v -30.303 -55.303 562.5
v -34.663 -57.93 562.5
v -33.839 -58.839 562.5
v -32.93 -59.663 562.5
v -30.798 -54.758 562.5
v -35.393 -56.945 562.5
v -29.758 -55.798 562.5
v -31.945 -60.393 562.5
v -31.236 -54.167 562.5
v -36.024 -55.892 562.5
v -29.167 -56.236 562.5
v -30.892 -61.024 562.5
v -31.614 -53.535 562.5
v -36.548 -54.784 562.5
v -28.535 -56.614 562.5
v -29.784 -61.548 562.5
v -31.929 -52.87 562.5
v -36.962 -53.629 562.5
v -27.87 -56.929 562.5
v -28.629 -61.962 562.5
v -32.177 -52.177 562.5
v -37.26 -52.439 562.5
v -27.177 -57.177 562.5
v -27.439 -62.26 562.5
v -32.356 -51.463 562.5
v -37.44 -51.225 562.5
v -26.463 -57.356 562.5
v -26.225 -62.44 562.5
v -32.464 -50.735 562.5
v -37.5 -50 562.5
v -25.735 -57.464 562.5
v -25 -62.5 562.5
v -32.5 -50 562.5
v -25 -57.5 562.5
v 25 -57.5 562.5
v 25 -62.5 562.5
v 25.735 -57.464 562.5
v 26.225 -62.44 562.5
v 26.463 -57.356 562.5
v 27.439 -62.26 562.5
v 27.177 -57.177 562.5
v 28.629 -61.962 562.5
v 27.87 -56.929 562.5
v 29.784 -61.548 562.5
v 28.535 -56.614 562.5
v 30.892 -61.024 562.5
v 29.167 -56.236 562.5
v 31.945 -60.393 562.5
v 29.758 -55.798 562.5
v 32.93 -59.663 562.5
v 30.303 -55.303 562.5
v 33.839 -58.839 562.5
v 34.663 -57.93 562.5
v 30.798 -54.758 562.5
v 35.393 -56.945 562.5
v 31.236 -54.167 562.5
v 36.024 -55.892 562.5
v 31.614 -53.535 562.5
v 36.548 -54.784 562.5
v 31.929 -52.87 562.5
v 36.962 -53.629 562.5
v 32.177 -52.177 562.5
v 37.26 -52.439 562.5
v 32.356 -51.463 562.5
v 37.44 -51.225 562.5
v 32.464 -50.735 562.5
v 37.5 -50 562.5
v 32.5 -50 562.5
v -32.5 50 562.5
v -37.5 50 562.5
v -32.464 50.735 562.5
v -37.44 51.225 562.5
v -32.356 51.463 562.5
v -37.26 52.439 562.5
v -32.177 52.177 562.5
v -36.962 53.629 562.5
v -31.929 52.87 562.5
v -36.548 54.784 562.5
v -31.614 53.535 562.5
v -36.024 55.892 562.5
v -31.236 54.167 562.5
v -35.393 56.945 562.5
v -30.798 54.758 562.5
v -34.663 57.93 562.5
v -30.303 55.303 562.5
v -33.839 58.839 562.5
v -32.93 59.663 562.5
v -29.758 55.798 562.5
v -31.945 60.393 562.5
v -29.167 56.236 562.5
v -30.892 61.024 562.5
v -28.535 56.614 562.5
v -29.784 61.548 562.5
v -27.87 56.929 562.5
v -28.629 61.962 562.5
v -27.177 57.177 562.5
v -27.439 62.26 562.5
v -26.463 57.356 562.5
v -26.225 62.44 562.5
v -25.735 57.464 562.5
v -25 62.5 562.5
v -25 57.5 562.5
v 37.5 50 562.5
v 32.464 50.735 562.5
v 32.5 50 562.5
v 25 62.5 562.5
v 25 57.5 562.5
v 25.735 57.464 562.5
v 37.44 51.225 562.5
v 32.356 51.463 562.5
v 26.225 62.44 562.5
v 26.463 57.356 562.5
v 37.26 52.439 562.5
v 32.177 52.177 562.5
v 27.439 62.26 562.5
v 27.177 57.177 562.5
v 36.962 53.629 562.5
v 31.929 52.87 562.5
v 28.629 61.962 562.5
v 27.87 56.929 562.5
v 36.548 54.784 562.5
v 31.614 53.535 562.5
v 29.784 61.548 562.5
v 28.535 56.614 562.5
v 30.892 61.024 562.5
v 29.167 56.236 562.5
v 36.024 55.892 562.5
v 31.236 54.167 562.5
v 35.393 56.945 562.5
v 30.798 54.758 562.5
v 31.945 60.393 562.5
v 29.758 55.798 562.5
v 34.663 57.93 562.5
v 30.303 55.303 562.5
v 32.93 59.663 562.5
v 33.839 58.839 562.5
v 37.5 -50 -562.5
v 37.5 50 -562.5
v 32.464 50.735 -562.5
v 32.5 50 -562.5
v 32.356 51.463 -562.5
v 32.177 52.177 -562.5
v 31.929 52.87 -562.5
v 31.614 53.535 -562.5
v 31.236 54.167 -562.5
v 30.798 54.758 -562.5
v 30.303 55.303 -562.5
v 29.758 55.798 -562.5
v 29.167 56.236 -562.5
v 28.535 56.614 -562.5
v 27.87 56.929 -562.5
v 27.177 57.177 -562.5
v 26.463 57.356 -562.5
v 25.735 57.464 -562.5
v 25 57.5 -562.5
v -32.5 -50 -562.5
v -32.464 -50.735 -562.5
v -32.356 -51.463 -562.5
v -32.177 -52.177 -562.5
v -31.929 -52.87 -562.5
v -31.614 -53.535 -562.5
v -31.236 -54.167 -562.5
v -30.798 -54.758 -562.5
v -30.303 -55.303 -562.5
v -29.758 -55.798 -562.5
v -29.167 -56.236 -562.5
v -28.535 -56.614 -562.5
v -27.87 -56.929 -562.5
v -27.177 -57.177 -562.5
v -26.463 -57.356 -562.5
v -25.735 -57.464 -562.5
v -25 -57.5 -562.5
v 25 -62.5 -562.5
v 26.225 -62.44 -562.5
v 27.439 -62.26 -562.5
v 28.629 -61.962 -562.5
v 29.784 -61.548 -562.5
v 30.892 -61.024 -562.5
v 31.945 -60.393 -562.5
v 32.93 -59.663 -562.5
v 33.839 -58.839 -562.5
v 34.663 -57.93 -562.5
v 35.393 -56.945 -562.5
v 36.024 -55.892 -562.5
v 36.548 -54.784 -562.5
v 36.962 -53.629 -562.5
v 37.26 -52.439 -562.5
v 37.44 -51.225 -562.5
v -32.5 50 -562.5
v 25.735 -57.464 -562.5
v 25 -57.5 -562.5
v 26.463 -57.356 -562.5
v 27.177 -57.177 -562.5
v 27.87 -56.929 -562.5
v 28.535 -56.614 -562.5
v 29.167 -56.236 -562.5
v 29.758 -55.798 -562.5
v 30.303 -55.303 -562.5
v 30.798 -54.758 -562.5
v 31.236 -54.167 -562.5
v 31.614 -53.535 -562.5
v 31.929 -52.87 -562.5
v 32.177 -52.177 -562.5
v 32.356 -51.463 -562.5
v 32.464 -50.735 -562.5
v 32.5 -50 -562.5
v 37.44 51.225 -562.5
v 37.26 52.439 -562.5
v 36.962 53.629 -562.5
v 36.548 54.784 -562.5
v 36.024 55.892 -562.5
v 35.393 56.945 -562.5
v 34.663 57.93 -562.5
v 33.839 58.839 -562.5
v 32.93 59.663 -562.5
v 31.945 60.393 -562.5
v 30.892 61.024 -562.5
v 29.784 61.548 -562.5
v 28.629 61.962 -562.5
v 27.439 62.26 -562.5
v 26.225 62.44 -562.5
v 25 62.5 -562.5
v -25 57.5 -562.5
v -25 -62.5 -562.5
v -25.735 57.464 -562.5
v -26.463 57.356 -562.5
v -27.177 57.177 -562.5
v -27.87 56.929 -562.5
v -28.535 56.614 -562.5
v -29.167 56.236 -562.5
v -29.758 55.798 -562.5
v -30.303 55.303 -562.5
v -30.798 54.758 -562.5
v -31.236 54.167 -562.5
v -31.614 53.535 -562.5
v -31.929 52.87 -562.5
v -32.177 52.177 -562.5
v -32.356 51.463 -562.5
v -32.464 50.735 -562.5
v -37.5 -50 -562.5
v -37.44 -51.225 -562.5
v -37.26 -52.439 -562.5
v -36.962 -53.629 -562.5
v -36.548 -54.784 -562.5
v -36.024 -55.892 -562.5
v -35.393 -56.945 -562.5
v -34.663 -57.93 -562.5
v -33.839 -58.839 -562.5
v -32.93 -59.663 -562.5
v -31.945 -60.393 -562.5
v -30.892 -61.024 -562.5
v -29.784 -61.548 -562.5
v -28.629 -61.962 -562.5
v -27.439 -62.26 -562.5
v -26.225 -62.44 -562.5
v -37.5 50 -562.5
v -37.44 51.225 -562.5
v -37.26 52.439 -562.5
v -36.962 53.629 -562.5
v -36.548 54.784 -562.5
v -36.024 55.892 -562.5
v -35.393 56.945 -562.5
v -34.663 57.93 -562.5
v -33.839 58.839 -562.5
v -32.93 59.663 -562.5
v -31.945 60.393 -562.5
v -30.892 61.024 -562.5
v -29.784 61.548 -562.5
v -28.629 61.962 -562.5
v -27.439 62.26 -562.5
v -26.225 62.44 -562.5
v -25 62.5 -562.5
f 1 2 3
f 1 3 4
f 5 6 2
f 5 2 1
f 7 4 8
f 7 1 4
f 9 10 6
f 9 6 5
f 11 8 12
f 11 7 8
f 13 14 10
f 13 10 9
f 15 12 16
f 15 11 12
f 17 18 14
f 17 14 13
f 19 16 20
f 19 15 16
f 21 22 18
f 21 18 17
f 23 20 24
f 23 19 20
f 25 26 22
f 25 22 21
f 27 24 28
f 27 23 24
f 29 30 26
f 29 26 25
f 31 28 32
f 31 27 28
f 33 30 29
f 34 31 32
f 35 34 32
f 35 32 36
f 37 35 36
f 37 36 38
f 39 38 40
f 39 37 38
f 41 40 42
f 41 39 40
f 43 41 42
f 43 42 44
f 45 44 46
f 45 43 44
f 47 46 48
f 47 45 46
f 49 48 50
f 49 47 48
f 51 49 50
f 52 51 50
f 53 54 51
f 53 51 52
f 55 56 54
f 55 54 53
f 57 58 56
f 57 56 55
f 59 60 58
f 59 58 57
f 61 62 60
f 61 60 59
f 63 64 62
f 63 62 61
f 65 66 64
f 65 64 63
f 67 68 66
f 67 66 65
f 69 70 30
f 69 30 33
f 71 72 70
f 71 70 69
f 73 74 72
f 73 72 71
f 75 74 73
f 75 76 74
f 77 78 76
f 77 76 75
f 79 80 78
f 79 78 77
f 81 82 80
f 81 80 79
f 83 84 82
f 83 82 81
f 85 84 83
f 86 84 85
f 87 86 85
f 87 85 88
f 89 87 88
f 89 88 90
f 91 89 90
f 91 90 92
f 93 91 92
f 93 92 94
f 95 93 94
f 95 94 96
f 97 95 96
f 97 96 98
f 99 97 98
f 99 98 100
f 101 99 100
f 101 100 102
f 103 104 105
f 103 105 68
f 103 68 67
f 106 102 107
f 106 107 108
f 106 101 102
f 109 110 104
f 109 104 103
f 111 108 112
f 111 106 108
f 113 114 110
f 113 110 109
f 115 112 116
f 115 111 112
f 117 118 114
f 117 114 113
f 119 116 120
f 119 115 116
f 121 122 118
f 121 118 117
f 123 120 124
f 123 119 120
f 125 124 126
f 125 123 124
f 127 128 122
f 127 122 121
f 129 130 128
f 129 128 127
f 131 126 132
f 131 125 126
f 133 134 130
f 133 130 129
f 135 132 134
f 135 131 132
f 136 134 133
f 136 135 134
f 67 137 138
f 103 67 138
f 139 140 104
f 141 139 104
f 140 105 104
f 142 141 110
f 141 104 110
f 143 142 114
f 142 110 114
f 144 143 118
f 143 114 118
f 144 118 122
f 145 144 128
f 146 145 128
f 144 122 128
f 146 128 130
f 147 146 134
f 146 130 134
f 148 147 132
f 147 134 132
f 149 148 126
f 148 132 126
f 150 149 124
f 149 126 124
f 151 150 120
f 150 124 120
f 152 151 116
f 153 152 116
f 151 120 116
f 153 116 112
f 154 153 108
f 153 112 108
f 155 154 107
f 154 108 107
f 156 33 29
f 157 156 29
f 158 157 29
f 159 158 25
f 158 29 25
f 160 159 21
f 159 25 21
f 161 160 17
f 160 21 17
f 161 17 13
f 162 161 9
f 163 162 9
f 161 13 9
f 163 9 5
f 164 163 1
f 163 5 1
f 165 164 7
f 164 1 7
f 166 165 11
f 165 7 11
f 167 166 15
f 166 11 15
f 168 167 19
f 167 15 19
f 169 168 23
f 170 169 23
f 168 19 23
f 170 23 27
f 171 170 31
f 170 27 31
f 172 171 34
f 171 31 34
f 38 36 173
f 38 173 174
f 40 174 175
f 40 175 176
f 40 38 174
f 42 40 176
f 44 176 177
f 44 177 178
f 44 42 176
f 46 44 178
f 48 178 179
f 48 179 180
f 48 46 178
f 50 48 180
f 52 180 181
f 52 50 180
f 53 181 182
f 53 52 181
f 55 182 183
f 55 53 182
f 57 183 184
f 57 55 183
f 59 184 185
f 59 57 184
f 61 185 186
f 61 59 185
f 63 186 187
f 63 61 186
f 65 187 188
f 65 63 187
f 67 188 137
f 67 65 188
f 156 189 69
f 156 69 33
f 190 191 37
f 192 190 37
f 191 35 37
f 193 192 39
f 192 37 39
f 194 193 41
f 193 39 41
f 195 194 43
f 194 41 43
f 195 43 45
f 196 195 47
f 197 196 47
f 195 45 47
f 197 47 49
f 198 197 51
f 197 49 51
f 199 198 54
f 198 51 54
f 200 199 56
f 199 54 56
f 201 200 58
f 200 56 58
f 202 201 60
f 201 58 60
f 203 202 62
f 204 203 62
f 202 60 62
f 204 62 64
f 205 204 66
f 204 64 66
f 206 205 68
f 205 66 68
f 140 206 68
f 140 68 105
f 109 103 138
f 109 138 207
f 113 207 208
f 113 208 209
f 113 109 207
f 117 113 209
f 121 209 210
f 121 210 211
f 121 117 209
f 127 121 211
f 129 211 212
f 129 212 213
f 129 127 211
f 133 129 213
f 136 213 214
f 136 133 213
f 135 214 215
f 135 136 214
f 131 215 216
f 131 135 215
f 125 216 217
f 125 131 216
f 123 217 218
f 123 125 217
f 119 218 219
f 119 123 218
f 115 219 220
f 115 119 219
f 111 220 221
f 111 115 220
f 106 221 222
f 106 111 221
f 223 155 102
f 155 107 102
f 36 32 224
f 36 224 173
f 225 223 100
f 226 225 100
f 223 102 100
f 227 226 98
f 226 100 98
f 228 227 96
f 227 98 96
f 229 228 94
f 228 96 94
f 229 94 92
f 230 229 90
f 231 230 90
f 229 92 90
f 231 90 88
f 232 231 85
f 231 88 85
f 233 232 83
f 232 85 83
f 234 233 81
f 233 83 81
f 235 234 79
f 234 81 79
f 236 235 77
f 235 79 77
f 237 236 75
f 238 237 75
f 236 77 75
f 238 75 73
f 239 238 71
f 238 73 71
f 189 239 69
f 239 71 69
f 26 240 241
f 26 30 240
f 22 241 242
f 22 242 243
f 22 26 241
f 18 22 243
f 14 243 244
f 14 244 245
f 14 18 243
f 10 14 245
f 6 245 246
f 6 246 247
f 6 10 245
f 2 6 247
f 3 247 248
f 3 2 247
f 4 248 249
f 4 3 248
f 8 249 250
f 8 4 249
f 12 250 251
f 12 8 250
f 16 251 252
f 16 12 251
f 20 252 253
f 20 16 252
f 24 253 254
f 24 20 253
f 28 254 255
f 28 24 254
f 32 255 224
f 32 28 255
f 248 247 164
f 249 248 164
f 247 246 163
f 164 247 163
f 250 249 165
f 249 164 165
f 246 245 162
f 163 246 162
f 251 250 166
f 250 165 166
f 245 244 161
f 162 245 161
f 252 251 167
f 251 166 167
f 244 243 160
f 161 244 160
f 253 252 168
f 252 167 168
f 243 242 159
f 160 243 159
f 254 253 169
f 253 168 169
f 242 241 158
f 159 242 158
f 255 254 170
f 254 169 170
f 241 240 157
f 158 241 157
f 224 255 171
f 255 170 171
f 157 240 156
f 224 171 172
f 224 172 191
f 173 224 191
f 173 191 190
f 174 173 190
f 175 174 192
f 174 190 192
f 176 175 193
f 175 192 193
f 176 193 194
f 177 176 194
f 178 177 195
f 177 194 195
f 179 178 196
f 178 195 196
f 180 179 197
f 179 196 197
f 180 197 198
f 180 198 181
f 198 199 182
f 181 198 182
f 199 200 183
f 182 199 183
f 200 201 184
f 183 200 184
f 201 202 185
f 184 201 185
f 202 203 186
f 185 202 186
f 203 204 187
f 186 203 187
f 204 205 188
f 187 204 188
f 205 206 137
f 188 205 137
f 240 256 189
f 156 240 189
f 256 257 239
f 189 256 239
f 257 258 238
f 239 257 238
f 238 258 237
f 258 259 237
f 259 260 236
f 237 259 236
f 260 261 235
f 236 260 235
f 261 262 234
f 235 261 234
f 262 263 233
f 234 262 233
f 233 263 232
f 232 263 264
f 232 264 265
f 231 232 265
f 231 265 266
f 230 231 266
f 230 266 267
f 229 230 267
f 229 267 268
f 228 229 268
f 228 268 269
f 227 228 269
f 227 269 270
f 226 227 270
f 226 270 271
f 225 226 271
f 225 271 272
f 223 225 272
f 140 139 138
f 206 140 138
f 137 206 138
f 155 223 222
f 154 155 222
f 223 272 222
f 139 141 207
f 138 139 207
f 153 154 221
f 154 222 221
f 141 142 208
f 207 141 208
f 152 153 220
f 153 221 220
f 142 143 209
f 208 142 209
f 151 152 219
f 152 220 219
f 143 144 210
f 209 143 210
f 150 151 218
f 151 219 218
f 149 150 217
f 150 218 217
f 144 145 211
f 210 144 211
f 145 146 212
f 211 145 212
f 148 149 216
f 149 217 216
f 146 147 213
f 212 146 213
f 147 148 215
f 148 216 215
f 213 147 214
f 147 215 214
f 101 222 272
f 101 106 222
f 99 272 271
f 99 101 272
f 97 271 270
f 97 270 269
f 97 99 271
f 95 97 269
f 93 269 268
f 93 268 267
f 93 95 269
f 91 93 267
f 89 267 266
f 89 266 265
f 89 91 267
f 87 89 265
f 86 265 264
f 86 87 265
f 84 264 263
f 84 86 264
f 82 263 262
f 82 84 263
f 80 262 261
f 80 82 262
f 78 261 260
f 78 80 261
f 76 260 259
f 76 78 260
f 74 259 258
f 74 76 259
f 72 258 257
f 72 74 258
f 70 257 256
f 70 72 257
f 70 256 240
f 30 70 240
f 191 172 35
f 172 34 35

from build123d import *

# Parameters (mm, degrees)
BOSS_EXTRUDE1_DEPTH = 562.5


with BuildPart() as part:
    # Sketch1 → Boss-Extrude1 (new, symmetric)
    with BuildSketch(Plane.XY):
        with BuildLine():
            Line((-37.5, 0), (-37.5, -50))
            ThreePointArc((-37.5, -50), (-33.838834765, -58.838834765), (-25, -62.5))
            Line((-25, -62.5), (0, -62.5))
            Line((0, -62.5), (25, -62.5))
            ThreePointArc((25, -62.5), (33.838834765, -58.838834765), (37.5, -50))
            Line((37.5, -50), (37.5, 0))
            Line((37.5, 0), (37.5, 50))
            ThreePointArc((37.5, 50), (33.838834765, 58.838834765), (25, 62.5))
            Line((25, 62.5), (-25, 62.5))
            ThreePointArc((-25, 62.5), (-33.838834765, 58.838834765), (-37.5, 50))
            Line((-37.5, 50), (-37.5, 0))
        make_face()
        with BuildLine():
            Line((-32.5, 0), (-32.5, -50))
            ThreePointArc((-32.5, -50), (-30.303300859, -55.303300859), (-25, -57.5))
            Line((-25, -57.5), (0, -57.5))
            Line((0, -57.5), (25, -57.5))
            ThreePointArc((25, -57.5), (30.303300859, -55.303300859), (32.5, -50))
            Line((32.5, -50), (32.5, 0))
            Line((32.5, 0), (32.5, 50))
            ThreePointArc((32.5, 50), (30.303300859, 55.303300859), (25, 57.5))
            Line((25, 57.5), (-25, 57.5))
            ThreePointArc((-25, 57.5), (-30.303300859, 55.303300859), (-32.5, 50))
            Line((-32.5, 50), (-32.5, 0))
        make_face(mode=Mode.SUBTRACT)
    extrude(amount=BOSS_EXTRUDE1_DEPTH, both=True)


solid = part.part
